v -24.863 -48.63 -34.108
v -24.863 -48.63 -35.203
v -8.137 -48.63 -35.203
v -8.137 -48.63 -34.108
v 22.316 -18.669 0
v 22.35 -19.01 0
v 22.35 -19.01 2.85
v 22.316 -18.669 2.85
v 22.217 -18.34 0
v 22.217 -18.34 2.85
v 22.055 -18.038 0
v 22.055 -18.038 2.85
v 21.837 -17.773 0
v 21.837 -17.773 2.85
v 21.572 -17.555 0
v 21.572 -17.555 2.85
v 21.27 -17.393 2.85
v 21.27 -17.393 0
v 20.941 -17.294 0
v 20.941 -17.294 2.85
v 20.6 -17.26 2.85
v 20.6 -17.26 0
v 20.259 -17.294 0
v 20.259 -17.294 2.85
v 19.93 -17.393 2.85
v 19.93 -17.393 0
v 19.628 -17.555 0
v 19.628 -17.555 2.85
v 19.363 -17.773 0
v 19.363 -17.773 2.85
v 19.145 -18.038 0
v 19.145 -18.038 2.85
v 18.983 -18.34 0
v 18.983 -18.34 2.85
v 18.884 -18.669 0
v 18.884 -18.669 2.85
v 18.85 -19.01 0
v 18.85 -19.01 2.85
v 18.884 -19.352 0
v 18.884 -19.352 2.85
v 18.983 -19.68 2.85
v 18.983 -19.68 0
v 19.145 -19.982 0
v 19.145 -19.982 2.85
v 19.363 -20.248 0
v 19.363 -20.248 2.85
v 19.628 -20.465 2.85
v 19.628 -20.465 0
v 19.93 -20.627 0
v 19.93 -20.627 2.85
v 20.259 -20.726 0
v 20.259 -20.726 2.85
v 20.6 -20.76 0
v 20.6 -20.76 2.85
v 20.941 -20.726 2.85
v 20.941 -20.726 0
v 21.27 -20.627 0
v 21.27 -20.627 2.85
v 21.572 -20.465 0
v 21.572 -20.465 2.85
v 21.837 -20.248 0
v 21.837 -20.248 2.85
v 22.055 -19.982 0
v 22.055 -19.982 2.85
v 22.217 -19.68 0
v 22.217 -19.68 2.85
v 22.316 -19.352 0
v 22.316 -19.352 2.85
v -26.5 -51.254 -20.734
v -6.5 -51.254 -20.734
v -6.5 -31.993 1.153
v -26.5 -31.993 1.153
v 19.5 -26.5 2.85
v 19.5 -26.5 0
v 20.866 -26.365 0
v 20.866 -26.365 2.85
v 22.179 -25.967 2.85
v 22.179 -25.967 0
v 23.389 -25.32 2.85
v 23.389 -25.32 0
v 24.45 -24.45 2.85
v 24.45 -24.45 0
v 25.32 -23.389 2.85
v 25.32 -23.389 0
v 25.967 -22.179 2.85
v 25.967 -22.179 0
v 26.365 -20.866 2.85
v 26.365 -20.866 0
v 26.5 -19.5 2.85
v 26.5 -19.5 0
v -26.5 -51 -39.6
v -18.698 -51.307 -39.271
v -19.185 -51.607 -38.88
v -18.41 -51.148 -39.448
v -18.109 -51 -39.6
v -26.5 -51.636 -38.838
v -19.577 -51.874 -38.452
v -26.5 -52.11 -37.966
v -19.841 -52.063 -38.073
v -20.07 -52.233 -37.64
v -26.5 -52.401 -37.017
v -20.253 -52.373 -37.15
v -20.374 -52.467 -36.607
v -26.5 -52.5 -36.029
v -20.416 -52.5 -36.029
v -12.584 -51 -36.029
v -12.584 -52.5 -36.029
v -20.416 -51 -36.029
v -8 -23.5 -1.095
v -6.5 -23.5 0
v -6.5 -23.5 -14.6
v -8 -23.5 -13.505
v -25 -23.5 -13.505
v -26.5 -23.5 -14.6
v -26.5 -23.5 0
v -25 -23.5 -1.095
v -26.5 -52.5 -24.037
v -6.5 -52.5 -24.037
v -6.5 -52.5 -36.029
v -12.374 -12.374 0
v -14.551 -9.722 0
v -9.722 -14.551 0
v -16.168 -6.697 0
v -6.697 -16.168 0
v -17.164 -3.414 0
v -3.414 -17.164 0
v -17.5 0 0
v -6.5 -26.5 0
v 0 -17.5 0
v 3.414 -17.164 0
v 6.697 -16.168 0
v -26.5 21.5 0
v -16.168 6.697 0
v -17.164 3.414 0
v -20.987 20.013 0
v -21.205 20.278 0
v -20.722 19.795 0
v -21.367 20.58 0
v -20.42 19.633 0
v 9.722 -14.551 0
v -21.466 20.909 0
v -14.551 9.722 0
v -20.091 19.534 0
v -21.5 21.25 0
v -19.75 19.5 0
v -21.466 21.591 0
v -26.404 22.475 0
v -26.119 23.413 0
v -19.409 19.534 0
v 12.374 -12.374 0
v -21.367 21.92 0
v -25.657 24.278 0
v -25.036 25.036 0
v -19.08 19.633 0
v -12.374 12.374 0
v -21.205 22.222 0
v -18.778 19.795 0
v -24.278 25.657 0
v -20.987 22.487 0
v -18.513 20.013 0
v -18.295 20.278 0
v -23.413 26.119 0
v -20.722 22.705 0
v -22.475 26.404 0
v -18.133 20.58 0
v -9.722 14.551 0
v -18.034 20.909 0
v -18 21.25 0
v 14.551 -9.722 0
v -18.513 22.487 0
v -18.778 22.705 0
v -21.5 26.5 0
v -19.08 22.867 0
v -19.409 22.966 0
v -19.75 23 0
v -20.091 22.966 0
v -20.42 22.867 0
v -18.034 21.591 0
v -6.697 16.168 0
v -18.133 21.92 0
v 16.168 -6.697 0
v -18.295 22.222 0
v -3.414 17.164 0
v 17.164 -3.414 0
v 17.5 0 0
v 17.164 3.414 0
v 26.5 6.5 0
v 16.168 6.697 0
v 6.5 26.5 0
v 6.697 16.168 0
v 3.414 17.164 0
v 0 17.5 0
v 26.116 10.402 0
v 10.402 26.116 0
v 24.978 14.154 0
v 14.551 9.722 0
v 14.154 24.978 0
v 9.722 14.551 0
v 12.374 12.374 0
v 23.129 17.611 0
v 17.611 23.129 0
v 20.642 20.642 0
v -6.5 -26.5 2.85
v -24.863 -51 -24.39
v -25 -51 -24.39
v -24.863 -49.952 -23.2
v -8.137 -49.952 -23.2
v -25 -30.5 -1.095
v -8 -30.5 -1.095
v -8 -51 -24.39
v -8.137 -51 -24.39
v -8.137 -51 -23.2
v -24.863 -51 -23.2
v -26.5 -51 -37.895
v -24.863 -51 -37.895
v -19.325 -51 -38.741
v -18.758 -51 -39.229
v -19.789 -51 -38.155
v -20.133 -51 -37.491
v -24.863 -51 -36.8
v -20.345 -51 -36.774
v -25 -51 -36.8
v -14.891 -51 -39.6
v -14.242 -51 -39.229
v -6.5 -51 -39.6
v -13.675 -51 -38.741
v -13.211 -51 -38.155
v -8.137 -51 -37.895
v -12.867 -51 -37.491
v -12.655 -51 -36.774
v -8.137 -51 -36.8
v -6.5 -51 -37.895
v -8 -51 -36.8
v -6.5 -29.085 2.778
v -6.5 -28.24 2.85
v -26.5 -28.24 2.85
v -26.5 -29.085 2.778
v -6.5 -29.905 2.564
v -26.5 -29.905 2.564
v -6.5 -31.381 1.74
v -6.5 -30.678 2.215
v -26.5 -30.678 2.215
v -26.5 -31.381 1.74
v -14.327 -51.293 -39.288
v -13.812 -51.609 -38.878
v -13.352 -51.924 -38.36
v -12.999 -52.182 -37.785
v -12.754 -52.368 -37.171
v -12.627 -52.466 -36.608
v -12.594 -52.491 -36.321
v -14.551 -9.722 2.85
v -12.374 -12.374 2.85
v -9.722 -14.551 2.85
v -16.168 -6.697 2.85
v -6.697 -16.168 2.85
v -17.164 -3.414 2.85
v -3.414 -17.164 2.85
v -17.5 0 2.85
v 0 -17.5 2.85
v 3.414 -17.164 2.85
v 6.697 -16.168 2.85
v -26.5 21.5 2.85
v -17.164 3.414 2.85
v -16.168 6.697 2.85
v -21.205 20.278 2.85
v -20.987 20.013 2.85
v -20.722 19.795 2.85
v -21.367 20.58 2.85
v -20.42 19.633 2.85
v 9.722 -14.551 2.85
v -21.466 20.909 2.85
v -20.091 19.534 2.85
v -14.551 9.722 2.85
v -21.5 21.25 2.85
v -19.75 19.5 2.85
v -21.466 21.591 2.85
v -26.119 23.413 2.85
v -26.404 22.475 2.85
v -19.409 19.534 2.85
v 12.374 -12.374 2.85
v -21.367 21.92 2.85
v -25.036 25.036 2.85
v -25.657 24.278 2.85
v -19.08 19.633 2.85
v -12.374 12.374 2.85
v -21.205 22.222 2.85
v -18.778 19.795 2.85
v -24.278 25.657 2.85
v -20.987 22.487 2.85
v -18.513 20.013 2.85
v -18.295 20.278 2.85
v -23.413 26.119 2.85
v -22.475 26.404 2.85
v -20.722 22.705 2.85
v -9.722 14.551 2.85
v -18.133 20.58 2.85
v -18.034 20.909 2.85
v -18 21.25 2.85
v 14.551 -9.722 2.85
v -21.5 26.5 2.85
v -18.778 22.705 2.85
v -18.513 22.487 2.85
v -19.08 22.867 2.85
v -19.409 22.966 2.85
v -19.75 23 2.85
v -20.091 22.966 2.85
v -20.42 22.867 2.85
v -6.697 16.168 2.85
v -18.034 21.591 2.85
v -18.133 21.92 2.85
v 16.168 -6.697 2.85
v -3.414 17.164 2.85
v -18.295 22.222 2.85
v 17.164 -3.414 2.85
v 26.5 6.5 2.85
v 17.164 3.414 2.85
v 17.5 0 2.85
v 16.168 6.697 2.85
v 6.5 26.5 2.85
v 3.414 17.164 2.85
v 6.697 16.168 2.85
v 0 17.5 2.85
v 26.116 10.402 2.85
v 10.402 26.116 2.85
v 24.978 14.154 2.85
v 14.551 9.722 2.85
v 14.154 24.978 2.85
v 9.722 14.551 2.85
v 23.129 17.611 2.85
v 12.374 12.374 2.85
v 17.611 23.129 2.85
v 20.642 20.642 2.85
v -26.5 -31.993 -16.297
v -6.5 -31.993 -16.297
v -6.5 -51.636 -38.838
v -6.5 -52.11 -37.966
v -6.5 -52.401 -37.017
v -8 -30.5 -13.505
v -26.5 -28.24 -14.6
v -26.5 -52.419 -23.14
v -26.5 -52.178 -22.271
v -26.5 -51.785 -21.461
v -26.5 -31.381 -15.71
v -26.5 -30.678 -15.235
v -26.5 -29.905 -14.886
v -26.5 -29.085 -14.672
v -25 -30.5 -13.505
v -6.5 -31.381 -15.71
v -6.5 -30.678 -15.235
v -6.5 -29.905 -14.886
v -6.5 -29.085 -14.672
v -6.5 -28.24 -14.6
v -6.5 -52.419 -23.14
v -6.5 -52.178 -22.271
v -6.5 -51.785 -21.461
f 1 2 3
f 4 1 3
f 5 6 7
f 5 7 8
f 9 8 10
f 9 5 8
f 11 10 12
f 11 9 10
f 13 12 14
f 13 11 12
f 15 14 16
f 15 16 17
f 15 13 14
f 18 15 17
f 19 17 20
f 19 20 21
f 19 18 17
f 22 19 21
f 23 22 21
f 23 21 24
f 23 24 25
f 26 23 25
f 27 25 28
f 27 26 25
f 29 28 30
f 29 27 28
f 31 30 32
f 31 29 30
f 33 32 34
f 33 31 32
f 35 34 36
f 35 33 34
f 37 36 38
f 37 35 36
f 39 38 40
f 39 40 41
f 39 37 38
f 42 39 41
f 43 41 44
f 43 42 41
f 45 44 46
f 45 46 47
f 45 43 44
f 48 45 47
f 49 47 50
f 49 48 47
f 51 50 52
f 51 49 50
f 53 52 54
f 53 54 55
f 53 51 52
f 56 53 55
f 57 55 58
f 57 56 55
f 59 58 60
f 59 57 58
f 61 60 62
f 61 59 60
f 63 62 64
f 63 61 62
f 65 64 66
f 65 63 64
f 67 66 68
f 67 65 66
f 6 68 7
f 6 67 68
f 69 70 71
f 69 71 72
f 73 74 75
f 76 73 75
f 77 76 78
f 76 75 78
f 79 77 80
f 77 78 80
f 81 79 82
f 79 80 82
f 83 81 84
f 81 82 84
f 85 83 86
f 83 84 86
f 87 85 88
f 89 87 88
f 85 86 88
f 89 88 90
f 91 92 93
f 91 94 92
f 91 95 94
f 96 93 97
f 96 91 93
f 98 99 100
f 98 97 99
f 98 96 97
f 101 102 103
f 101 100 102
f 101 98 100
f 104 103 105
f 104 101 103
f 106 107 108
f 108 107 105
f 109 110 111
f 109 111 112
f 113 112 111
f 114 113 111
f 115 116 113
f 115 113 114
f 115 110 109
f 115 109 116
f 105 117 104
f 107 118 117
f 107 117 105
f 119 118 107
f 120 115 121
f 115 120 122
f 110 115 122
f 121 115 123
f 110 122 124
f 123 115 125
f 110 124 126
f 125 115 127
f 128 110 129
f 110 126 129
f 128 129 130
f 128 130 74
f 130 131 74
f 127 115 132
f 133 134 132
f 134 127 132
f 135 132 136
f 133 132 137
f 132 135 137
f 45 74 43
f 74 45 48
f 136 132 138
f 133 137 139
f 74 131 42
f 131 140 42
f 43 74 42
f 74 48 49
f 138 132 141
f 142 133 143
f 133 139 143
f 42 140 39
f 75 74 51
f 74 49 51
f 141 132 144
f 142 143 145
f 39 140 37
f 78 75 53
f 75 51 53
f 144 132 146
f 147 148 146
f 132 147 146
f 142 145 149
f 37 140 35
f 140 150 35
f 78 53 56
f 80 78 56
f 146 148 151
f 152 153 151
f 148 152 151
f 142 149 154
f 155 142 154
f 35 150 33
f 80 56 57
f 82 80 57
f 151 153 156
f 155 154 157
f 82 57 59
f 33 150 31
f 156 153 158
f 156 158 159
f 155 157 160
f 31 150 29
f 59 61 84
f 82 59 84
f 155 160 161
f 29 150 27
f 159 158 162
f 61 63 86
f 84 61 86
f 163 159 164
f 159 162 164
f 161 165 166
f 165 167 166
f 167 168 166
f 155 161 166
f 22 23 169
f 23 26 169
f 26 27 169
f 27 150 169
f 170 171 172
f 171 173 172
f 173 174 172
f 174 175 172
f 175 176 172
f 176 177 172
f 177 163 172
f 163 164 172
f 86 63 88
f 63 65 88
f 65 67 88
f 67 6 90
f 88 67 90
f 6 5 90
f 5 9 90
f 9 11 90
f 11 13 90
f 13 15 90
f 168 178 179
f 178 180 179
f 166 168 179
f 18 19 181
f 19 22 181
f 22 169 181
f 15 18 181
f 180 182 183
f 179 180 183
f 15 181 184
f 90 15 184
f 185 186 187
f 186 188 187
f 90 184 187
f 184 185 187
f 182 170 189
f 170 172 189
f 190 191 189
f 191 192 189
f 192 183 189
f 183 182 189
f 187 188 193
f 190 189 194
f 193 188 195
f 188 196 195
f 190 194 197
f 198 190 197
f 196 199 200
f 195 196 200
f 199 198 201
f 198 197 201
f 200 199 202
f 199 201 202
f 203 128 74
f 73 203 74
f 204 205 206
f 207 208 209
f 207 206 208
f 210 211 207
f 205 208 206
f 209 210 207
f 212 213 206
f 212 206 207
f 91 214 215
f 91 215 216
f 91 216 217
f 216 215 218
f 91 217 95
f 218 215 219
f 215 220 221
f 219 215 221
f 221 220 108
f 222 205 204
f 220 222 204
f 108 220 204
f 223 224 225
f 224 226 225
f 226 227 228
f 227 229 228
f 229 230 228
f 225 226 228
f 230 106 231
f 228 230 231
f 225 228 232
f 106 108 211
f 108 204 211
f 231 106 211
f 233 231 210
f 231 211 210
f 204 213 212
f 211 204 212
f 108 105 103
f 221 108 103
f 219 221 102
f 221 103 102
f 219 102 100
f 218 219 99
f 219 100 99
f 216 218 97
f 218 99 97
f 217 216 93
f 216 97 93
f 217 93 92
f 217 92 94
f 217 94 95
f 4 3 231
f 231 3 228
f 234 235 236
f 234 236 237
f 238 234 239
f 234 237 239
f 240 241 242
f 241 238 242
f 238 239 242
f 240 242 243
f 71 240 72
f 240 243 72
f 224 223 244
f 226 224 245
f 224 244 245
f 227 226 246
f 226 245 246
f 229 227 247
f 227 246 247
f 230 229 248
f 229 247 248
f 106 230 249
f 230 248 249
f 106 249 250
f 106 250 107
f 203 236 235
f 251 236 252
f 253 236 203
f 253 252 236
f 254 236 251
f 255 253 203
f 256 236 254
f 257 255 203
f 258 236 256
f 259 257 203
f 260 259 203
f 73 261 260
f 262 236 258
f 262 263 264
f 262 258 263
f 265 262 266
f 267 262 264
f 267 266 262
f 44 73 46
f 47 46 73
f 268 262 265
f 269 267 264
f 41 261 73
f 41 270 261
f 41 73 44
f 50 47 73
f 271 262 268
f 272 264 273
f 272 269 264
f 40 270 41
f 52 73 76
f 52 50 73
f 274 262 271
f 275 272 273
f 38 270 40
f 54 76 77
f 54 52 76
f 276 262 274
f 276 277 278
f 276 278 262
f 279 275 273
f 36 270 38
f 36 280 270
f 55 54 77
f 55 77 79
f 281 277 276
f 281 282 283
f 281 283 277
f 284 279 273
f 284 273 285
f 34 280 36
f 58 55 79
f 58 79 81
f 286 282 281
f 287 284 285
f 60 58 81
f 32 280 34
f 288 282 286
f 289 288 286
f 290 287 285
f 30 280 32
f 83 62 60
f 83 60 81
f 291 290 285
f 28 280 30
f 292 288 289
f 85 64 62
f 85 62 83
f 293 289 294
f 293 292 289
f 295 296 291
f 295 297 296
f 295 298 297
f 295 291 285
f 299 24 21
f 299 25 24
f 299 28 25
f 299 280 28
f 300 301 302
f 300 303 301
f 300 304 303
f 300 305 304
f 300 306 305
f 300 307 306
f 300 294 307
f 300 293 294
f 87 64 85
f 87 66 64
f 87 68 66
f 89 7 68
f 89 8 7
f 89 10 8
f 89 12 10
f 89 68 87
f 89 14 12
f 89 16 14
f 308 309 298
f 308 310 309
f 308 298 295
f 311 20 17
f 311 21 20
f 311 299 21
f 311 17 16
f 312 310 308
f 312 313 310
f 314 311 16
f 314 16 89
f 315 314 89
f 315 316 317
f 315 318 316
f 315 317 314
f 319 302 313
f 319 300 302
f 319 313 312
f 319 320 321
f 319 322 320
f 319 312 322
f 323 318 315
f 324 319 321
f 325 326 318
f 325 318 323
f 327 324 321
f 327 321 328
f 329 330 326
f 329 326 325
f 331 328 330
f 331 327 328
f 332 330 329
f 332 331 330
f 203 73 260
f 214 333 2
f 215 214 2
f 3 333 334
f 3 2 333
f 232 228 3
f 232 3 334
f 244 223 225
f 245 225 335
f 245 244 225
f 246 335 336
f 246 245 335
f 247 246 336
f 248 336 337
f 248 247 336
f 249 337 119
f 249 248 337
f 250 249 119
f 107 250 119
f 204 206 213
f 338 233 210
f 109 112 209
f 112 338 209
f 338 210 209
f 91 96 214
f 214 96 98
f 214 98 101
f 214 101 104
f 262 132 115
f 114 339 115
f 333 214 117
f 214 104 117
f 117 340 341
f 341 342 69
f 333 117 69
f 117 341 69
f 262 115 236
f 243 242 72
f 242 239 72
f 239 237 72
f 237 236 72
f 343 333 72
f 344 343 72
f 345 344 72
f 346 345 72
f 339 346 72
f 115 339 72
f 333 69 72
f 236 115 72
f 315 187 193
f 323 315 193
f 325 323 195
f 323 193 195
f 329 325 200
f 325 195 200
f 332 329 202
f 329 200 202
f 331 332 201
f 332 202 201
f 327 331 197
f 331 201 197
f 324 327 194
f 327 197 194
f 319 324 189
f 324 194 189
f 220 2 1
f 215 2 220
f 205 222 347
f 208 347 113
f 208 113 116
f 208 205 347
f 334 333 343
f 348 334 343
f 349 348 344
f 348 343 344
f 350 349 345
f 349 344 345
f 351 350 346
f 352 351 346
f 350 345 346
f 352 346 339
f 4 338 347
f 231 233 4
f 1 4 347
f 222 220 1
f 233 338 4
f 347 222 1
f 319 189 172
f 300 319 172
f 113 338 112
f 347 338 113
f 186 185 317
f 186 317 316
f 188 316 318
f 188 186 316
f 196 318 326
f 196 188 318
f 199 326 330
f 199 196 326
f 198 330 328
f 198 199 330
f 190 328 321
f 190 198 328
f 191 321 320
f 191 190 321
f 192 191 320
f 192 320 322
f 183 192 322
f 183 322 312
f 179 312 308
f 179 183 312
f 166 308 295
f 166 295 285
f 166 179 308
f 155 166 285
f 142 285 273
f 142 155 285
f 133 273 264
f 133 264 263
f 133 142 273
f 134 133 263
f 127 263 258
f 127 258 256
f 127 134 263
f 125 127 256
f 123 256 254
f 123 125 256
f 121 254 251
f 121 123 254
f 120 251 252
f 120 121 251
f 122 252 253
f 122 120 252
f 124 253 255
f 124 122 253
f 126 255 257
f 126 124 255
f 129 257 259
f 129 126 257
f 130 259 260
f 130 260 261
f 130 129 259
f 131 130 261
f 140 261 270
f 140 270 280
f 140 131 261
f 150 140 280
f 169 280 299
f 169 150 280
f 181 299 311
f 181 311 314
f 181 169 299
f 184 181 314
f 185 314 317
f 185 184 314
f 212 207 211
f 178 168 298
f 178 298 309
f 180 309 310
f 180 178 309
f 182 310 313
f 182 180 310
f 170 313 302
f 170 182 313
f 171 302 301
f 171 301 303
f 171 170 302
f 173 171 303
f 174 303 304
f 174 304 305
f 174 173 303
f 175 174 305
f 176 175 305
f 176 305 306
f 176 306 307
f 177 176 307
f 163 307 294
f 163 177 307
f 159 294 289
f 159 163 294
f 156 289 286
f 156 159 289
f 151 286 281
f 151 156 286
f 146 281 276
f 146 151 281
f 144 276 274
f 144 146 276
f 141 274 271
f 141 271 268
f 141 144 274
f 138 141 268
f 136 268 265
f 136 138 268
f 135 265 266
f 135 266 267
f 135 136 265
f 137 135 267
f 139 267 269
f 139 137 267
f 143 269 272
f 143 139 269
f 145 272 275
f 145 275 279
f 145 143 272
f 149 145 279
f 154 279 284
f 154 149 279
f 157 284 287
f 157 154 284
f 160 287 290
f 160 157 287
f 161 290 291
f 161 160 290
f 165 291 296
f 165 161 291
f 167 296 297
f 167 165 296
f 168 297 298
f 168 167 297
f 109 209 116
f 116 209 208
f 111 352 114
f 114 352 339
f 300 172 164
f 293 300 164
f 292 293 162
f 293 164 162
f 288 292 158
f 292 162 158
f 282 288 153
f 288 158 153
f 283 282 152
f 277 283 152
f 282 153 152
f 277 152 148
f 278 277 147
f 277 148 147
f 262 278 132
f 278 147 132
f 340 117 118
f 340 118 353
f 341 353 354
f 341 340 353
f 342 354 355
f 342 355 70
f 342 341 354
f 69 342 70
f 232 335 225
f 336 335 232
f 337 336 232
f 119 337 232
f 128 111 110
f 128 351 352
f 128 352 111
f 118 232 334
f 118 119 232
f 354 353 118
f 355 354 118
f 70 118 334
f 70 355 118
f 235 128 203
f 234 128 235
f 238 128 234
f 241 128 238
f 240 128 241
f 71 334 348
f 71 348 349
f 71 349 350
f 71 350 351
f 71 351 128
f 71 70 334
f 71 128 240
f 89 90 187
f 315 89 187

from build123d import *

# Parameters (mm, degrees)
F0_R         = 1.75
F0_R_2       = 17.5
F1_DEPTH     = 2.85
F2_W         = 20
F2_H         = 4
F3_DEPTH     = 14.6
F4_W         = 17
F4_H         = 12.41
F5_DEPTH     = 25
F3_FACE1_W   = 20
F3_FACE1_H   = 17.45
F3_FACE1_W_2 = 17
F3_FACE1_H_2 = 12.41
F9_W         = 20
F9_H         = 17.45
F10_DEPTH    = 1.5
F11_W        = 16.7262982869
F11_H        = 2.3696432114
F12_DEPTH    = 16.4
F13_T1_DEPTH = 20
F13_T3_DEPTH = 31.3016516107
F13_T5_DEPTH = 29.4336950122
F13_T7_DEPTH = 37.8535710714
F4_W_2       = 20
F4_H_2       = 14.6
F14_DEPTH    = 3
F16_DEPTH    = 25


# Not quite as in the source:
# - a fillet or chamfer that OpenCascade refuses, or shapes differently, is made with other operations: its cross-section is extruded or revolved along the edge and cut away or added


with BuildPart() as f1:
    # F0 (on Top) → F1 (new body)
    with BuildSketch(Plane.XY):
        with BuildLine():
            Line((-6.5, -26.5), (19.5, -26.5))
            ThreePointArc((19.5, -26.5), (24.4497474683, -24.4497474683), (26.5, -19.5))
            Line((26.5, -19.5), (26.5, 6.5))
            ThreePointArc((26.5, 6.5), (20.6421356237, 20.6421356237), (6.5, 26.5))
            Line((6.5, 26.5), (-21.5, 26.5))
            ThreePointArc((-21.5, 26.5), (-25.0355339059, 25.0355339059), (-26.5, 21.5))
            Line((-26.5, 21.5), (-26.5, -26.5))
            Line((-26.5, -26.5), (-26.5, -30.5))
            Line((-26.5, -30.5), (-6.5, -30.5))
            Line((-6.5, -30.5), (-6.5, -26.5))
        make_face()
        with Locations((20.6, -19.0101229506)):
            Circle(F0_R, mode=Mode.SUBTRACT)
        with Locations((-19.75, 21.25)):
            Circle(F0_R, mode=Mode.SUBTRACT)
        Circle(F0_R_2, mode=Mode.SUBTRACT)
    extrude(amount=F1_DEPTH)

    # F2 (on face) → F3 (join)
    with BuildSketch(Plane(origin=(0, 0, 0), x_dir=(1, 0, 0), z_dir=(0, 0, -1))):
        with Locations((-16.5, 28.5)):
            Rectangle(F2_W, F2_H)
    extrude(amount=F3_DEPTH)

    # F4 (on face) → F5 (cut)
    with BuildSketch(Plane(origin=(0, -26.5, 0), x_dir=(-1, 0, 0), z_dir=(0, 1, 0))):
        with Locations((16.5, -7.3)):
            Rectangle(F4_W, F4_H)
    extrude(amount=-F5_DEPTH, mode=Mode.SUBTRACT)

    # F8: sweep along a path in F7
    with BuildLine(Plane.YZ.offset(-16.5)) as f8_path:
        Line((-30.5838297752, -0.1396118733), (-52.5838297752, -25.1396118733))
    # F3_face1 (on face) → F8 (sweep)
    with BuildSketch(Plane(origin=(-16.5, -30.5, -3.6969789176), x_dir=(1, 0, 0), z_dir=(0, -1, 0))):
        with Locations((0, -2.1780210824)):
            Rectangle(F3_FACE1_W, F3_FACE1_H)
        with Locations((0, -3.6030210824)):
            Rectangle(F3_FACE1_W_2, F3_FACE1_H_2, mode=Mode.SUBTRACT)
    sweep(path=f8_path.line)

    # F9 (on face) → F10 (join)
    with BuildSketch(Plane.XZ.offset(52.5)):
        with Locations((-16.5, -30.875)):
            Rectangle(F9_W, F9_H)
    extrude(amount=-F10_DEPTH)

    # F11 (on face) → F12 (cut)
    with BuildSketch(Plane(origin=(0, 0, -39.6), x_dir=(1, 0, 0), z_dir=(0, 0, -1))):
        with Locations((-16.5000008565, 49.8151783943)):
            Rectangle(F11_W, F11_H)
    extrude(amount=-F12_DEPTH, mode=Mode.SUBTRACT)

    # F13: fillet of radius 5 on 4 edges, made by hand

    # F13_s2 → F13_t1 (join)
    with BuildSketch(Plane.YZ.offset(-26.5)):
        with BuildLine():
            ThreePointArc((-31.9932372625, -16.2968605255), (-30.299318025, -15.0439217867), (-28.2396696779, -14.6))
            Line((-28.2396696779, -14.6), (-30.5, -14.6))
            Line((-30.5, -14.6), (-31.9932372625, -16.2968605255))
        make_face()
    extrude(amount=F13_T1_DEPTH)

    # F13_s4 → F13_t3 (cut)
    with BuildSketch(Plane.YZ.offset(-32.1508258053)):
        with BuildLine():
            ThreePointArc((-28.2396696779, 2.85), (-30.299318025, 2.4060782133), (-31.9932372625, 1.1531394745))
            Line((-31.9932372625, 1.1531394745), (-30.5, 2.85))
            Line((-30.5, 2.85), (-28.2396696779, 2.85))
        make_face()
    extrude(amount=F13_T3_DEPTH, mode=Mode.SUBTRACT)

    # F13_s6 → F13_t5 (cut)
    with BuildSketch(Plane.YZ.offset(-31.2168475061)):
        with BuildLine():
            ThreePointArc((-52.5, -24.0367390024), (-52.1780251134, -22.2714965153), (-51.2535675846, -20.733599528))
            Line((-51.2535675846, -20.733599528), (-52.5, -22.15))
            Line((-52.5, -22.15), (-52.5, -24.0367390024))
        make_face()
    extrude(amount=F13_T5_DEPTH, mode=Mode.SUBTRACT)

    # F13_s8 → F13_t7 (cut)
    with BuildSketch(Plane.YZ.offset(-35.4267855357)):
        with BuildLine():
            ThreePointArc((-51, -39.6), (-52.1097722286, -37.9657774588), (-52.5, -36.0292857857))
            Line((-52.5, -36.0292857857), (-52.5, -39.6))
            Line((-52.5, -39.6), (-51, -39.6))
        make_face()
    extrude(amount=F13_T7_DEPTH, mode=Mode.SUBTRACT)

    # F4 (on face) → F14 (join)
    with BuildSketch(Plane(origin=(0, -26.5, 0), x_dir=(-1, 0, 0), z_dir=(0, 1, 0))):
        with Locations((16.5, -7.3)):
            Rectangle(F4_W_2, F4_H_2)
        with Locations((16.5, -7.3)):
            Rectangle(F4_W, F4_H, mode=Mode.SUBTRACT)
    extrude(amount=F14_DEPTH)

    # F15 (on face) → F16 (cut)
    with BuildSketch(Plane.XZ.offset(52.5)):
        with BuildLine():
            Line((-12.5835244641, -36.0292857857), (-20.4164755359, -36.0292857857))
            ThreePointArc((-20.4164755359, -36.0292857857), (-16.5, -39.9457613216), (-12.5835244641, -36.0292857857))
        make_face()
    extrude(amount=-F16_DEPTH, mode=Mode.SUBTRACT)


solid = f1.part
